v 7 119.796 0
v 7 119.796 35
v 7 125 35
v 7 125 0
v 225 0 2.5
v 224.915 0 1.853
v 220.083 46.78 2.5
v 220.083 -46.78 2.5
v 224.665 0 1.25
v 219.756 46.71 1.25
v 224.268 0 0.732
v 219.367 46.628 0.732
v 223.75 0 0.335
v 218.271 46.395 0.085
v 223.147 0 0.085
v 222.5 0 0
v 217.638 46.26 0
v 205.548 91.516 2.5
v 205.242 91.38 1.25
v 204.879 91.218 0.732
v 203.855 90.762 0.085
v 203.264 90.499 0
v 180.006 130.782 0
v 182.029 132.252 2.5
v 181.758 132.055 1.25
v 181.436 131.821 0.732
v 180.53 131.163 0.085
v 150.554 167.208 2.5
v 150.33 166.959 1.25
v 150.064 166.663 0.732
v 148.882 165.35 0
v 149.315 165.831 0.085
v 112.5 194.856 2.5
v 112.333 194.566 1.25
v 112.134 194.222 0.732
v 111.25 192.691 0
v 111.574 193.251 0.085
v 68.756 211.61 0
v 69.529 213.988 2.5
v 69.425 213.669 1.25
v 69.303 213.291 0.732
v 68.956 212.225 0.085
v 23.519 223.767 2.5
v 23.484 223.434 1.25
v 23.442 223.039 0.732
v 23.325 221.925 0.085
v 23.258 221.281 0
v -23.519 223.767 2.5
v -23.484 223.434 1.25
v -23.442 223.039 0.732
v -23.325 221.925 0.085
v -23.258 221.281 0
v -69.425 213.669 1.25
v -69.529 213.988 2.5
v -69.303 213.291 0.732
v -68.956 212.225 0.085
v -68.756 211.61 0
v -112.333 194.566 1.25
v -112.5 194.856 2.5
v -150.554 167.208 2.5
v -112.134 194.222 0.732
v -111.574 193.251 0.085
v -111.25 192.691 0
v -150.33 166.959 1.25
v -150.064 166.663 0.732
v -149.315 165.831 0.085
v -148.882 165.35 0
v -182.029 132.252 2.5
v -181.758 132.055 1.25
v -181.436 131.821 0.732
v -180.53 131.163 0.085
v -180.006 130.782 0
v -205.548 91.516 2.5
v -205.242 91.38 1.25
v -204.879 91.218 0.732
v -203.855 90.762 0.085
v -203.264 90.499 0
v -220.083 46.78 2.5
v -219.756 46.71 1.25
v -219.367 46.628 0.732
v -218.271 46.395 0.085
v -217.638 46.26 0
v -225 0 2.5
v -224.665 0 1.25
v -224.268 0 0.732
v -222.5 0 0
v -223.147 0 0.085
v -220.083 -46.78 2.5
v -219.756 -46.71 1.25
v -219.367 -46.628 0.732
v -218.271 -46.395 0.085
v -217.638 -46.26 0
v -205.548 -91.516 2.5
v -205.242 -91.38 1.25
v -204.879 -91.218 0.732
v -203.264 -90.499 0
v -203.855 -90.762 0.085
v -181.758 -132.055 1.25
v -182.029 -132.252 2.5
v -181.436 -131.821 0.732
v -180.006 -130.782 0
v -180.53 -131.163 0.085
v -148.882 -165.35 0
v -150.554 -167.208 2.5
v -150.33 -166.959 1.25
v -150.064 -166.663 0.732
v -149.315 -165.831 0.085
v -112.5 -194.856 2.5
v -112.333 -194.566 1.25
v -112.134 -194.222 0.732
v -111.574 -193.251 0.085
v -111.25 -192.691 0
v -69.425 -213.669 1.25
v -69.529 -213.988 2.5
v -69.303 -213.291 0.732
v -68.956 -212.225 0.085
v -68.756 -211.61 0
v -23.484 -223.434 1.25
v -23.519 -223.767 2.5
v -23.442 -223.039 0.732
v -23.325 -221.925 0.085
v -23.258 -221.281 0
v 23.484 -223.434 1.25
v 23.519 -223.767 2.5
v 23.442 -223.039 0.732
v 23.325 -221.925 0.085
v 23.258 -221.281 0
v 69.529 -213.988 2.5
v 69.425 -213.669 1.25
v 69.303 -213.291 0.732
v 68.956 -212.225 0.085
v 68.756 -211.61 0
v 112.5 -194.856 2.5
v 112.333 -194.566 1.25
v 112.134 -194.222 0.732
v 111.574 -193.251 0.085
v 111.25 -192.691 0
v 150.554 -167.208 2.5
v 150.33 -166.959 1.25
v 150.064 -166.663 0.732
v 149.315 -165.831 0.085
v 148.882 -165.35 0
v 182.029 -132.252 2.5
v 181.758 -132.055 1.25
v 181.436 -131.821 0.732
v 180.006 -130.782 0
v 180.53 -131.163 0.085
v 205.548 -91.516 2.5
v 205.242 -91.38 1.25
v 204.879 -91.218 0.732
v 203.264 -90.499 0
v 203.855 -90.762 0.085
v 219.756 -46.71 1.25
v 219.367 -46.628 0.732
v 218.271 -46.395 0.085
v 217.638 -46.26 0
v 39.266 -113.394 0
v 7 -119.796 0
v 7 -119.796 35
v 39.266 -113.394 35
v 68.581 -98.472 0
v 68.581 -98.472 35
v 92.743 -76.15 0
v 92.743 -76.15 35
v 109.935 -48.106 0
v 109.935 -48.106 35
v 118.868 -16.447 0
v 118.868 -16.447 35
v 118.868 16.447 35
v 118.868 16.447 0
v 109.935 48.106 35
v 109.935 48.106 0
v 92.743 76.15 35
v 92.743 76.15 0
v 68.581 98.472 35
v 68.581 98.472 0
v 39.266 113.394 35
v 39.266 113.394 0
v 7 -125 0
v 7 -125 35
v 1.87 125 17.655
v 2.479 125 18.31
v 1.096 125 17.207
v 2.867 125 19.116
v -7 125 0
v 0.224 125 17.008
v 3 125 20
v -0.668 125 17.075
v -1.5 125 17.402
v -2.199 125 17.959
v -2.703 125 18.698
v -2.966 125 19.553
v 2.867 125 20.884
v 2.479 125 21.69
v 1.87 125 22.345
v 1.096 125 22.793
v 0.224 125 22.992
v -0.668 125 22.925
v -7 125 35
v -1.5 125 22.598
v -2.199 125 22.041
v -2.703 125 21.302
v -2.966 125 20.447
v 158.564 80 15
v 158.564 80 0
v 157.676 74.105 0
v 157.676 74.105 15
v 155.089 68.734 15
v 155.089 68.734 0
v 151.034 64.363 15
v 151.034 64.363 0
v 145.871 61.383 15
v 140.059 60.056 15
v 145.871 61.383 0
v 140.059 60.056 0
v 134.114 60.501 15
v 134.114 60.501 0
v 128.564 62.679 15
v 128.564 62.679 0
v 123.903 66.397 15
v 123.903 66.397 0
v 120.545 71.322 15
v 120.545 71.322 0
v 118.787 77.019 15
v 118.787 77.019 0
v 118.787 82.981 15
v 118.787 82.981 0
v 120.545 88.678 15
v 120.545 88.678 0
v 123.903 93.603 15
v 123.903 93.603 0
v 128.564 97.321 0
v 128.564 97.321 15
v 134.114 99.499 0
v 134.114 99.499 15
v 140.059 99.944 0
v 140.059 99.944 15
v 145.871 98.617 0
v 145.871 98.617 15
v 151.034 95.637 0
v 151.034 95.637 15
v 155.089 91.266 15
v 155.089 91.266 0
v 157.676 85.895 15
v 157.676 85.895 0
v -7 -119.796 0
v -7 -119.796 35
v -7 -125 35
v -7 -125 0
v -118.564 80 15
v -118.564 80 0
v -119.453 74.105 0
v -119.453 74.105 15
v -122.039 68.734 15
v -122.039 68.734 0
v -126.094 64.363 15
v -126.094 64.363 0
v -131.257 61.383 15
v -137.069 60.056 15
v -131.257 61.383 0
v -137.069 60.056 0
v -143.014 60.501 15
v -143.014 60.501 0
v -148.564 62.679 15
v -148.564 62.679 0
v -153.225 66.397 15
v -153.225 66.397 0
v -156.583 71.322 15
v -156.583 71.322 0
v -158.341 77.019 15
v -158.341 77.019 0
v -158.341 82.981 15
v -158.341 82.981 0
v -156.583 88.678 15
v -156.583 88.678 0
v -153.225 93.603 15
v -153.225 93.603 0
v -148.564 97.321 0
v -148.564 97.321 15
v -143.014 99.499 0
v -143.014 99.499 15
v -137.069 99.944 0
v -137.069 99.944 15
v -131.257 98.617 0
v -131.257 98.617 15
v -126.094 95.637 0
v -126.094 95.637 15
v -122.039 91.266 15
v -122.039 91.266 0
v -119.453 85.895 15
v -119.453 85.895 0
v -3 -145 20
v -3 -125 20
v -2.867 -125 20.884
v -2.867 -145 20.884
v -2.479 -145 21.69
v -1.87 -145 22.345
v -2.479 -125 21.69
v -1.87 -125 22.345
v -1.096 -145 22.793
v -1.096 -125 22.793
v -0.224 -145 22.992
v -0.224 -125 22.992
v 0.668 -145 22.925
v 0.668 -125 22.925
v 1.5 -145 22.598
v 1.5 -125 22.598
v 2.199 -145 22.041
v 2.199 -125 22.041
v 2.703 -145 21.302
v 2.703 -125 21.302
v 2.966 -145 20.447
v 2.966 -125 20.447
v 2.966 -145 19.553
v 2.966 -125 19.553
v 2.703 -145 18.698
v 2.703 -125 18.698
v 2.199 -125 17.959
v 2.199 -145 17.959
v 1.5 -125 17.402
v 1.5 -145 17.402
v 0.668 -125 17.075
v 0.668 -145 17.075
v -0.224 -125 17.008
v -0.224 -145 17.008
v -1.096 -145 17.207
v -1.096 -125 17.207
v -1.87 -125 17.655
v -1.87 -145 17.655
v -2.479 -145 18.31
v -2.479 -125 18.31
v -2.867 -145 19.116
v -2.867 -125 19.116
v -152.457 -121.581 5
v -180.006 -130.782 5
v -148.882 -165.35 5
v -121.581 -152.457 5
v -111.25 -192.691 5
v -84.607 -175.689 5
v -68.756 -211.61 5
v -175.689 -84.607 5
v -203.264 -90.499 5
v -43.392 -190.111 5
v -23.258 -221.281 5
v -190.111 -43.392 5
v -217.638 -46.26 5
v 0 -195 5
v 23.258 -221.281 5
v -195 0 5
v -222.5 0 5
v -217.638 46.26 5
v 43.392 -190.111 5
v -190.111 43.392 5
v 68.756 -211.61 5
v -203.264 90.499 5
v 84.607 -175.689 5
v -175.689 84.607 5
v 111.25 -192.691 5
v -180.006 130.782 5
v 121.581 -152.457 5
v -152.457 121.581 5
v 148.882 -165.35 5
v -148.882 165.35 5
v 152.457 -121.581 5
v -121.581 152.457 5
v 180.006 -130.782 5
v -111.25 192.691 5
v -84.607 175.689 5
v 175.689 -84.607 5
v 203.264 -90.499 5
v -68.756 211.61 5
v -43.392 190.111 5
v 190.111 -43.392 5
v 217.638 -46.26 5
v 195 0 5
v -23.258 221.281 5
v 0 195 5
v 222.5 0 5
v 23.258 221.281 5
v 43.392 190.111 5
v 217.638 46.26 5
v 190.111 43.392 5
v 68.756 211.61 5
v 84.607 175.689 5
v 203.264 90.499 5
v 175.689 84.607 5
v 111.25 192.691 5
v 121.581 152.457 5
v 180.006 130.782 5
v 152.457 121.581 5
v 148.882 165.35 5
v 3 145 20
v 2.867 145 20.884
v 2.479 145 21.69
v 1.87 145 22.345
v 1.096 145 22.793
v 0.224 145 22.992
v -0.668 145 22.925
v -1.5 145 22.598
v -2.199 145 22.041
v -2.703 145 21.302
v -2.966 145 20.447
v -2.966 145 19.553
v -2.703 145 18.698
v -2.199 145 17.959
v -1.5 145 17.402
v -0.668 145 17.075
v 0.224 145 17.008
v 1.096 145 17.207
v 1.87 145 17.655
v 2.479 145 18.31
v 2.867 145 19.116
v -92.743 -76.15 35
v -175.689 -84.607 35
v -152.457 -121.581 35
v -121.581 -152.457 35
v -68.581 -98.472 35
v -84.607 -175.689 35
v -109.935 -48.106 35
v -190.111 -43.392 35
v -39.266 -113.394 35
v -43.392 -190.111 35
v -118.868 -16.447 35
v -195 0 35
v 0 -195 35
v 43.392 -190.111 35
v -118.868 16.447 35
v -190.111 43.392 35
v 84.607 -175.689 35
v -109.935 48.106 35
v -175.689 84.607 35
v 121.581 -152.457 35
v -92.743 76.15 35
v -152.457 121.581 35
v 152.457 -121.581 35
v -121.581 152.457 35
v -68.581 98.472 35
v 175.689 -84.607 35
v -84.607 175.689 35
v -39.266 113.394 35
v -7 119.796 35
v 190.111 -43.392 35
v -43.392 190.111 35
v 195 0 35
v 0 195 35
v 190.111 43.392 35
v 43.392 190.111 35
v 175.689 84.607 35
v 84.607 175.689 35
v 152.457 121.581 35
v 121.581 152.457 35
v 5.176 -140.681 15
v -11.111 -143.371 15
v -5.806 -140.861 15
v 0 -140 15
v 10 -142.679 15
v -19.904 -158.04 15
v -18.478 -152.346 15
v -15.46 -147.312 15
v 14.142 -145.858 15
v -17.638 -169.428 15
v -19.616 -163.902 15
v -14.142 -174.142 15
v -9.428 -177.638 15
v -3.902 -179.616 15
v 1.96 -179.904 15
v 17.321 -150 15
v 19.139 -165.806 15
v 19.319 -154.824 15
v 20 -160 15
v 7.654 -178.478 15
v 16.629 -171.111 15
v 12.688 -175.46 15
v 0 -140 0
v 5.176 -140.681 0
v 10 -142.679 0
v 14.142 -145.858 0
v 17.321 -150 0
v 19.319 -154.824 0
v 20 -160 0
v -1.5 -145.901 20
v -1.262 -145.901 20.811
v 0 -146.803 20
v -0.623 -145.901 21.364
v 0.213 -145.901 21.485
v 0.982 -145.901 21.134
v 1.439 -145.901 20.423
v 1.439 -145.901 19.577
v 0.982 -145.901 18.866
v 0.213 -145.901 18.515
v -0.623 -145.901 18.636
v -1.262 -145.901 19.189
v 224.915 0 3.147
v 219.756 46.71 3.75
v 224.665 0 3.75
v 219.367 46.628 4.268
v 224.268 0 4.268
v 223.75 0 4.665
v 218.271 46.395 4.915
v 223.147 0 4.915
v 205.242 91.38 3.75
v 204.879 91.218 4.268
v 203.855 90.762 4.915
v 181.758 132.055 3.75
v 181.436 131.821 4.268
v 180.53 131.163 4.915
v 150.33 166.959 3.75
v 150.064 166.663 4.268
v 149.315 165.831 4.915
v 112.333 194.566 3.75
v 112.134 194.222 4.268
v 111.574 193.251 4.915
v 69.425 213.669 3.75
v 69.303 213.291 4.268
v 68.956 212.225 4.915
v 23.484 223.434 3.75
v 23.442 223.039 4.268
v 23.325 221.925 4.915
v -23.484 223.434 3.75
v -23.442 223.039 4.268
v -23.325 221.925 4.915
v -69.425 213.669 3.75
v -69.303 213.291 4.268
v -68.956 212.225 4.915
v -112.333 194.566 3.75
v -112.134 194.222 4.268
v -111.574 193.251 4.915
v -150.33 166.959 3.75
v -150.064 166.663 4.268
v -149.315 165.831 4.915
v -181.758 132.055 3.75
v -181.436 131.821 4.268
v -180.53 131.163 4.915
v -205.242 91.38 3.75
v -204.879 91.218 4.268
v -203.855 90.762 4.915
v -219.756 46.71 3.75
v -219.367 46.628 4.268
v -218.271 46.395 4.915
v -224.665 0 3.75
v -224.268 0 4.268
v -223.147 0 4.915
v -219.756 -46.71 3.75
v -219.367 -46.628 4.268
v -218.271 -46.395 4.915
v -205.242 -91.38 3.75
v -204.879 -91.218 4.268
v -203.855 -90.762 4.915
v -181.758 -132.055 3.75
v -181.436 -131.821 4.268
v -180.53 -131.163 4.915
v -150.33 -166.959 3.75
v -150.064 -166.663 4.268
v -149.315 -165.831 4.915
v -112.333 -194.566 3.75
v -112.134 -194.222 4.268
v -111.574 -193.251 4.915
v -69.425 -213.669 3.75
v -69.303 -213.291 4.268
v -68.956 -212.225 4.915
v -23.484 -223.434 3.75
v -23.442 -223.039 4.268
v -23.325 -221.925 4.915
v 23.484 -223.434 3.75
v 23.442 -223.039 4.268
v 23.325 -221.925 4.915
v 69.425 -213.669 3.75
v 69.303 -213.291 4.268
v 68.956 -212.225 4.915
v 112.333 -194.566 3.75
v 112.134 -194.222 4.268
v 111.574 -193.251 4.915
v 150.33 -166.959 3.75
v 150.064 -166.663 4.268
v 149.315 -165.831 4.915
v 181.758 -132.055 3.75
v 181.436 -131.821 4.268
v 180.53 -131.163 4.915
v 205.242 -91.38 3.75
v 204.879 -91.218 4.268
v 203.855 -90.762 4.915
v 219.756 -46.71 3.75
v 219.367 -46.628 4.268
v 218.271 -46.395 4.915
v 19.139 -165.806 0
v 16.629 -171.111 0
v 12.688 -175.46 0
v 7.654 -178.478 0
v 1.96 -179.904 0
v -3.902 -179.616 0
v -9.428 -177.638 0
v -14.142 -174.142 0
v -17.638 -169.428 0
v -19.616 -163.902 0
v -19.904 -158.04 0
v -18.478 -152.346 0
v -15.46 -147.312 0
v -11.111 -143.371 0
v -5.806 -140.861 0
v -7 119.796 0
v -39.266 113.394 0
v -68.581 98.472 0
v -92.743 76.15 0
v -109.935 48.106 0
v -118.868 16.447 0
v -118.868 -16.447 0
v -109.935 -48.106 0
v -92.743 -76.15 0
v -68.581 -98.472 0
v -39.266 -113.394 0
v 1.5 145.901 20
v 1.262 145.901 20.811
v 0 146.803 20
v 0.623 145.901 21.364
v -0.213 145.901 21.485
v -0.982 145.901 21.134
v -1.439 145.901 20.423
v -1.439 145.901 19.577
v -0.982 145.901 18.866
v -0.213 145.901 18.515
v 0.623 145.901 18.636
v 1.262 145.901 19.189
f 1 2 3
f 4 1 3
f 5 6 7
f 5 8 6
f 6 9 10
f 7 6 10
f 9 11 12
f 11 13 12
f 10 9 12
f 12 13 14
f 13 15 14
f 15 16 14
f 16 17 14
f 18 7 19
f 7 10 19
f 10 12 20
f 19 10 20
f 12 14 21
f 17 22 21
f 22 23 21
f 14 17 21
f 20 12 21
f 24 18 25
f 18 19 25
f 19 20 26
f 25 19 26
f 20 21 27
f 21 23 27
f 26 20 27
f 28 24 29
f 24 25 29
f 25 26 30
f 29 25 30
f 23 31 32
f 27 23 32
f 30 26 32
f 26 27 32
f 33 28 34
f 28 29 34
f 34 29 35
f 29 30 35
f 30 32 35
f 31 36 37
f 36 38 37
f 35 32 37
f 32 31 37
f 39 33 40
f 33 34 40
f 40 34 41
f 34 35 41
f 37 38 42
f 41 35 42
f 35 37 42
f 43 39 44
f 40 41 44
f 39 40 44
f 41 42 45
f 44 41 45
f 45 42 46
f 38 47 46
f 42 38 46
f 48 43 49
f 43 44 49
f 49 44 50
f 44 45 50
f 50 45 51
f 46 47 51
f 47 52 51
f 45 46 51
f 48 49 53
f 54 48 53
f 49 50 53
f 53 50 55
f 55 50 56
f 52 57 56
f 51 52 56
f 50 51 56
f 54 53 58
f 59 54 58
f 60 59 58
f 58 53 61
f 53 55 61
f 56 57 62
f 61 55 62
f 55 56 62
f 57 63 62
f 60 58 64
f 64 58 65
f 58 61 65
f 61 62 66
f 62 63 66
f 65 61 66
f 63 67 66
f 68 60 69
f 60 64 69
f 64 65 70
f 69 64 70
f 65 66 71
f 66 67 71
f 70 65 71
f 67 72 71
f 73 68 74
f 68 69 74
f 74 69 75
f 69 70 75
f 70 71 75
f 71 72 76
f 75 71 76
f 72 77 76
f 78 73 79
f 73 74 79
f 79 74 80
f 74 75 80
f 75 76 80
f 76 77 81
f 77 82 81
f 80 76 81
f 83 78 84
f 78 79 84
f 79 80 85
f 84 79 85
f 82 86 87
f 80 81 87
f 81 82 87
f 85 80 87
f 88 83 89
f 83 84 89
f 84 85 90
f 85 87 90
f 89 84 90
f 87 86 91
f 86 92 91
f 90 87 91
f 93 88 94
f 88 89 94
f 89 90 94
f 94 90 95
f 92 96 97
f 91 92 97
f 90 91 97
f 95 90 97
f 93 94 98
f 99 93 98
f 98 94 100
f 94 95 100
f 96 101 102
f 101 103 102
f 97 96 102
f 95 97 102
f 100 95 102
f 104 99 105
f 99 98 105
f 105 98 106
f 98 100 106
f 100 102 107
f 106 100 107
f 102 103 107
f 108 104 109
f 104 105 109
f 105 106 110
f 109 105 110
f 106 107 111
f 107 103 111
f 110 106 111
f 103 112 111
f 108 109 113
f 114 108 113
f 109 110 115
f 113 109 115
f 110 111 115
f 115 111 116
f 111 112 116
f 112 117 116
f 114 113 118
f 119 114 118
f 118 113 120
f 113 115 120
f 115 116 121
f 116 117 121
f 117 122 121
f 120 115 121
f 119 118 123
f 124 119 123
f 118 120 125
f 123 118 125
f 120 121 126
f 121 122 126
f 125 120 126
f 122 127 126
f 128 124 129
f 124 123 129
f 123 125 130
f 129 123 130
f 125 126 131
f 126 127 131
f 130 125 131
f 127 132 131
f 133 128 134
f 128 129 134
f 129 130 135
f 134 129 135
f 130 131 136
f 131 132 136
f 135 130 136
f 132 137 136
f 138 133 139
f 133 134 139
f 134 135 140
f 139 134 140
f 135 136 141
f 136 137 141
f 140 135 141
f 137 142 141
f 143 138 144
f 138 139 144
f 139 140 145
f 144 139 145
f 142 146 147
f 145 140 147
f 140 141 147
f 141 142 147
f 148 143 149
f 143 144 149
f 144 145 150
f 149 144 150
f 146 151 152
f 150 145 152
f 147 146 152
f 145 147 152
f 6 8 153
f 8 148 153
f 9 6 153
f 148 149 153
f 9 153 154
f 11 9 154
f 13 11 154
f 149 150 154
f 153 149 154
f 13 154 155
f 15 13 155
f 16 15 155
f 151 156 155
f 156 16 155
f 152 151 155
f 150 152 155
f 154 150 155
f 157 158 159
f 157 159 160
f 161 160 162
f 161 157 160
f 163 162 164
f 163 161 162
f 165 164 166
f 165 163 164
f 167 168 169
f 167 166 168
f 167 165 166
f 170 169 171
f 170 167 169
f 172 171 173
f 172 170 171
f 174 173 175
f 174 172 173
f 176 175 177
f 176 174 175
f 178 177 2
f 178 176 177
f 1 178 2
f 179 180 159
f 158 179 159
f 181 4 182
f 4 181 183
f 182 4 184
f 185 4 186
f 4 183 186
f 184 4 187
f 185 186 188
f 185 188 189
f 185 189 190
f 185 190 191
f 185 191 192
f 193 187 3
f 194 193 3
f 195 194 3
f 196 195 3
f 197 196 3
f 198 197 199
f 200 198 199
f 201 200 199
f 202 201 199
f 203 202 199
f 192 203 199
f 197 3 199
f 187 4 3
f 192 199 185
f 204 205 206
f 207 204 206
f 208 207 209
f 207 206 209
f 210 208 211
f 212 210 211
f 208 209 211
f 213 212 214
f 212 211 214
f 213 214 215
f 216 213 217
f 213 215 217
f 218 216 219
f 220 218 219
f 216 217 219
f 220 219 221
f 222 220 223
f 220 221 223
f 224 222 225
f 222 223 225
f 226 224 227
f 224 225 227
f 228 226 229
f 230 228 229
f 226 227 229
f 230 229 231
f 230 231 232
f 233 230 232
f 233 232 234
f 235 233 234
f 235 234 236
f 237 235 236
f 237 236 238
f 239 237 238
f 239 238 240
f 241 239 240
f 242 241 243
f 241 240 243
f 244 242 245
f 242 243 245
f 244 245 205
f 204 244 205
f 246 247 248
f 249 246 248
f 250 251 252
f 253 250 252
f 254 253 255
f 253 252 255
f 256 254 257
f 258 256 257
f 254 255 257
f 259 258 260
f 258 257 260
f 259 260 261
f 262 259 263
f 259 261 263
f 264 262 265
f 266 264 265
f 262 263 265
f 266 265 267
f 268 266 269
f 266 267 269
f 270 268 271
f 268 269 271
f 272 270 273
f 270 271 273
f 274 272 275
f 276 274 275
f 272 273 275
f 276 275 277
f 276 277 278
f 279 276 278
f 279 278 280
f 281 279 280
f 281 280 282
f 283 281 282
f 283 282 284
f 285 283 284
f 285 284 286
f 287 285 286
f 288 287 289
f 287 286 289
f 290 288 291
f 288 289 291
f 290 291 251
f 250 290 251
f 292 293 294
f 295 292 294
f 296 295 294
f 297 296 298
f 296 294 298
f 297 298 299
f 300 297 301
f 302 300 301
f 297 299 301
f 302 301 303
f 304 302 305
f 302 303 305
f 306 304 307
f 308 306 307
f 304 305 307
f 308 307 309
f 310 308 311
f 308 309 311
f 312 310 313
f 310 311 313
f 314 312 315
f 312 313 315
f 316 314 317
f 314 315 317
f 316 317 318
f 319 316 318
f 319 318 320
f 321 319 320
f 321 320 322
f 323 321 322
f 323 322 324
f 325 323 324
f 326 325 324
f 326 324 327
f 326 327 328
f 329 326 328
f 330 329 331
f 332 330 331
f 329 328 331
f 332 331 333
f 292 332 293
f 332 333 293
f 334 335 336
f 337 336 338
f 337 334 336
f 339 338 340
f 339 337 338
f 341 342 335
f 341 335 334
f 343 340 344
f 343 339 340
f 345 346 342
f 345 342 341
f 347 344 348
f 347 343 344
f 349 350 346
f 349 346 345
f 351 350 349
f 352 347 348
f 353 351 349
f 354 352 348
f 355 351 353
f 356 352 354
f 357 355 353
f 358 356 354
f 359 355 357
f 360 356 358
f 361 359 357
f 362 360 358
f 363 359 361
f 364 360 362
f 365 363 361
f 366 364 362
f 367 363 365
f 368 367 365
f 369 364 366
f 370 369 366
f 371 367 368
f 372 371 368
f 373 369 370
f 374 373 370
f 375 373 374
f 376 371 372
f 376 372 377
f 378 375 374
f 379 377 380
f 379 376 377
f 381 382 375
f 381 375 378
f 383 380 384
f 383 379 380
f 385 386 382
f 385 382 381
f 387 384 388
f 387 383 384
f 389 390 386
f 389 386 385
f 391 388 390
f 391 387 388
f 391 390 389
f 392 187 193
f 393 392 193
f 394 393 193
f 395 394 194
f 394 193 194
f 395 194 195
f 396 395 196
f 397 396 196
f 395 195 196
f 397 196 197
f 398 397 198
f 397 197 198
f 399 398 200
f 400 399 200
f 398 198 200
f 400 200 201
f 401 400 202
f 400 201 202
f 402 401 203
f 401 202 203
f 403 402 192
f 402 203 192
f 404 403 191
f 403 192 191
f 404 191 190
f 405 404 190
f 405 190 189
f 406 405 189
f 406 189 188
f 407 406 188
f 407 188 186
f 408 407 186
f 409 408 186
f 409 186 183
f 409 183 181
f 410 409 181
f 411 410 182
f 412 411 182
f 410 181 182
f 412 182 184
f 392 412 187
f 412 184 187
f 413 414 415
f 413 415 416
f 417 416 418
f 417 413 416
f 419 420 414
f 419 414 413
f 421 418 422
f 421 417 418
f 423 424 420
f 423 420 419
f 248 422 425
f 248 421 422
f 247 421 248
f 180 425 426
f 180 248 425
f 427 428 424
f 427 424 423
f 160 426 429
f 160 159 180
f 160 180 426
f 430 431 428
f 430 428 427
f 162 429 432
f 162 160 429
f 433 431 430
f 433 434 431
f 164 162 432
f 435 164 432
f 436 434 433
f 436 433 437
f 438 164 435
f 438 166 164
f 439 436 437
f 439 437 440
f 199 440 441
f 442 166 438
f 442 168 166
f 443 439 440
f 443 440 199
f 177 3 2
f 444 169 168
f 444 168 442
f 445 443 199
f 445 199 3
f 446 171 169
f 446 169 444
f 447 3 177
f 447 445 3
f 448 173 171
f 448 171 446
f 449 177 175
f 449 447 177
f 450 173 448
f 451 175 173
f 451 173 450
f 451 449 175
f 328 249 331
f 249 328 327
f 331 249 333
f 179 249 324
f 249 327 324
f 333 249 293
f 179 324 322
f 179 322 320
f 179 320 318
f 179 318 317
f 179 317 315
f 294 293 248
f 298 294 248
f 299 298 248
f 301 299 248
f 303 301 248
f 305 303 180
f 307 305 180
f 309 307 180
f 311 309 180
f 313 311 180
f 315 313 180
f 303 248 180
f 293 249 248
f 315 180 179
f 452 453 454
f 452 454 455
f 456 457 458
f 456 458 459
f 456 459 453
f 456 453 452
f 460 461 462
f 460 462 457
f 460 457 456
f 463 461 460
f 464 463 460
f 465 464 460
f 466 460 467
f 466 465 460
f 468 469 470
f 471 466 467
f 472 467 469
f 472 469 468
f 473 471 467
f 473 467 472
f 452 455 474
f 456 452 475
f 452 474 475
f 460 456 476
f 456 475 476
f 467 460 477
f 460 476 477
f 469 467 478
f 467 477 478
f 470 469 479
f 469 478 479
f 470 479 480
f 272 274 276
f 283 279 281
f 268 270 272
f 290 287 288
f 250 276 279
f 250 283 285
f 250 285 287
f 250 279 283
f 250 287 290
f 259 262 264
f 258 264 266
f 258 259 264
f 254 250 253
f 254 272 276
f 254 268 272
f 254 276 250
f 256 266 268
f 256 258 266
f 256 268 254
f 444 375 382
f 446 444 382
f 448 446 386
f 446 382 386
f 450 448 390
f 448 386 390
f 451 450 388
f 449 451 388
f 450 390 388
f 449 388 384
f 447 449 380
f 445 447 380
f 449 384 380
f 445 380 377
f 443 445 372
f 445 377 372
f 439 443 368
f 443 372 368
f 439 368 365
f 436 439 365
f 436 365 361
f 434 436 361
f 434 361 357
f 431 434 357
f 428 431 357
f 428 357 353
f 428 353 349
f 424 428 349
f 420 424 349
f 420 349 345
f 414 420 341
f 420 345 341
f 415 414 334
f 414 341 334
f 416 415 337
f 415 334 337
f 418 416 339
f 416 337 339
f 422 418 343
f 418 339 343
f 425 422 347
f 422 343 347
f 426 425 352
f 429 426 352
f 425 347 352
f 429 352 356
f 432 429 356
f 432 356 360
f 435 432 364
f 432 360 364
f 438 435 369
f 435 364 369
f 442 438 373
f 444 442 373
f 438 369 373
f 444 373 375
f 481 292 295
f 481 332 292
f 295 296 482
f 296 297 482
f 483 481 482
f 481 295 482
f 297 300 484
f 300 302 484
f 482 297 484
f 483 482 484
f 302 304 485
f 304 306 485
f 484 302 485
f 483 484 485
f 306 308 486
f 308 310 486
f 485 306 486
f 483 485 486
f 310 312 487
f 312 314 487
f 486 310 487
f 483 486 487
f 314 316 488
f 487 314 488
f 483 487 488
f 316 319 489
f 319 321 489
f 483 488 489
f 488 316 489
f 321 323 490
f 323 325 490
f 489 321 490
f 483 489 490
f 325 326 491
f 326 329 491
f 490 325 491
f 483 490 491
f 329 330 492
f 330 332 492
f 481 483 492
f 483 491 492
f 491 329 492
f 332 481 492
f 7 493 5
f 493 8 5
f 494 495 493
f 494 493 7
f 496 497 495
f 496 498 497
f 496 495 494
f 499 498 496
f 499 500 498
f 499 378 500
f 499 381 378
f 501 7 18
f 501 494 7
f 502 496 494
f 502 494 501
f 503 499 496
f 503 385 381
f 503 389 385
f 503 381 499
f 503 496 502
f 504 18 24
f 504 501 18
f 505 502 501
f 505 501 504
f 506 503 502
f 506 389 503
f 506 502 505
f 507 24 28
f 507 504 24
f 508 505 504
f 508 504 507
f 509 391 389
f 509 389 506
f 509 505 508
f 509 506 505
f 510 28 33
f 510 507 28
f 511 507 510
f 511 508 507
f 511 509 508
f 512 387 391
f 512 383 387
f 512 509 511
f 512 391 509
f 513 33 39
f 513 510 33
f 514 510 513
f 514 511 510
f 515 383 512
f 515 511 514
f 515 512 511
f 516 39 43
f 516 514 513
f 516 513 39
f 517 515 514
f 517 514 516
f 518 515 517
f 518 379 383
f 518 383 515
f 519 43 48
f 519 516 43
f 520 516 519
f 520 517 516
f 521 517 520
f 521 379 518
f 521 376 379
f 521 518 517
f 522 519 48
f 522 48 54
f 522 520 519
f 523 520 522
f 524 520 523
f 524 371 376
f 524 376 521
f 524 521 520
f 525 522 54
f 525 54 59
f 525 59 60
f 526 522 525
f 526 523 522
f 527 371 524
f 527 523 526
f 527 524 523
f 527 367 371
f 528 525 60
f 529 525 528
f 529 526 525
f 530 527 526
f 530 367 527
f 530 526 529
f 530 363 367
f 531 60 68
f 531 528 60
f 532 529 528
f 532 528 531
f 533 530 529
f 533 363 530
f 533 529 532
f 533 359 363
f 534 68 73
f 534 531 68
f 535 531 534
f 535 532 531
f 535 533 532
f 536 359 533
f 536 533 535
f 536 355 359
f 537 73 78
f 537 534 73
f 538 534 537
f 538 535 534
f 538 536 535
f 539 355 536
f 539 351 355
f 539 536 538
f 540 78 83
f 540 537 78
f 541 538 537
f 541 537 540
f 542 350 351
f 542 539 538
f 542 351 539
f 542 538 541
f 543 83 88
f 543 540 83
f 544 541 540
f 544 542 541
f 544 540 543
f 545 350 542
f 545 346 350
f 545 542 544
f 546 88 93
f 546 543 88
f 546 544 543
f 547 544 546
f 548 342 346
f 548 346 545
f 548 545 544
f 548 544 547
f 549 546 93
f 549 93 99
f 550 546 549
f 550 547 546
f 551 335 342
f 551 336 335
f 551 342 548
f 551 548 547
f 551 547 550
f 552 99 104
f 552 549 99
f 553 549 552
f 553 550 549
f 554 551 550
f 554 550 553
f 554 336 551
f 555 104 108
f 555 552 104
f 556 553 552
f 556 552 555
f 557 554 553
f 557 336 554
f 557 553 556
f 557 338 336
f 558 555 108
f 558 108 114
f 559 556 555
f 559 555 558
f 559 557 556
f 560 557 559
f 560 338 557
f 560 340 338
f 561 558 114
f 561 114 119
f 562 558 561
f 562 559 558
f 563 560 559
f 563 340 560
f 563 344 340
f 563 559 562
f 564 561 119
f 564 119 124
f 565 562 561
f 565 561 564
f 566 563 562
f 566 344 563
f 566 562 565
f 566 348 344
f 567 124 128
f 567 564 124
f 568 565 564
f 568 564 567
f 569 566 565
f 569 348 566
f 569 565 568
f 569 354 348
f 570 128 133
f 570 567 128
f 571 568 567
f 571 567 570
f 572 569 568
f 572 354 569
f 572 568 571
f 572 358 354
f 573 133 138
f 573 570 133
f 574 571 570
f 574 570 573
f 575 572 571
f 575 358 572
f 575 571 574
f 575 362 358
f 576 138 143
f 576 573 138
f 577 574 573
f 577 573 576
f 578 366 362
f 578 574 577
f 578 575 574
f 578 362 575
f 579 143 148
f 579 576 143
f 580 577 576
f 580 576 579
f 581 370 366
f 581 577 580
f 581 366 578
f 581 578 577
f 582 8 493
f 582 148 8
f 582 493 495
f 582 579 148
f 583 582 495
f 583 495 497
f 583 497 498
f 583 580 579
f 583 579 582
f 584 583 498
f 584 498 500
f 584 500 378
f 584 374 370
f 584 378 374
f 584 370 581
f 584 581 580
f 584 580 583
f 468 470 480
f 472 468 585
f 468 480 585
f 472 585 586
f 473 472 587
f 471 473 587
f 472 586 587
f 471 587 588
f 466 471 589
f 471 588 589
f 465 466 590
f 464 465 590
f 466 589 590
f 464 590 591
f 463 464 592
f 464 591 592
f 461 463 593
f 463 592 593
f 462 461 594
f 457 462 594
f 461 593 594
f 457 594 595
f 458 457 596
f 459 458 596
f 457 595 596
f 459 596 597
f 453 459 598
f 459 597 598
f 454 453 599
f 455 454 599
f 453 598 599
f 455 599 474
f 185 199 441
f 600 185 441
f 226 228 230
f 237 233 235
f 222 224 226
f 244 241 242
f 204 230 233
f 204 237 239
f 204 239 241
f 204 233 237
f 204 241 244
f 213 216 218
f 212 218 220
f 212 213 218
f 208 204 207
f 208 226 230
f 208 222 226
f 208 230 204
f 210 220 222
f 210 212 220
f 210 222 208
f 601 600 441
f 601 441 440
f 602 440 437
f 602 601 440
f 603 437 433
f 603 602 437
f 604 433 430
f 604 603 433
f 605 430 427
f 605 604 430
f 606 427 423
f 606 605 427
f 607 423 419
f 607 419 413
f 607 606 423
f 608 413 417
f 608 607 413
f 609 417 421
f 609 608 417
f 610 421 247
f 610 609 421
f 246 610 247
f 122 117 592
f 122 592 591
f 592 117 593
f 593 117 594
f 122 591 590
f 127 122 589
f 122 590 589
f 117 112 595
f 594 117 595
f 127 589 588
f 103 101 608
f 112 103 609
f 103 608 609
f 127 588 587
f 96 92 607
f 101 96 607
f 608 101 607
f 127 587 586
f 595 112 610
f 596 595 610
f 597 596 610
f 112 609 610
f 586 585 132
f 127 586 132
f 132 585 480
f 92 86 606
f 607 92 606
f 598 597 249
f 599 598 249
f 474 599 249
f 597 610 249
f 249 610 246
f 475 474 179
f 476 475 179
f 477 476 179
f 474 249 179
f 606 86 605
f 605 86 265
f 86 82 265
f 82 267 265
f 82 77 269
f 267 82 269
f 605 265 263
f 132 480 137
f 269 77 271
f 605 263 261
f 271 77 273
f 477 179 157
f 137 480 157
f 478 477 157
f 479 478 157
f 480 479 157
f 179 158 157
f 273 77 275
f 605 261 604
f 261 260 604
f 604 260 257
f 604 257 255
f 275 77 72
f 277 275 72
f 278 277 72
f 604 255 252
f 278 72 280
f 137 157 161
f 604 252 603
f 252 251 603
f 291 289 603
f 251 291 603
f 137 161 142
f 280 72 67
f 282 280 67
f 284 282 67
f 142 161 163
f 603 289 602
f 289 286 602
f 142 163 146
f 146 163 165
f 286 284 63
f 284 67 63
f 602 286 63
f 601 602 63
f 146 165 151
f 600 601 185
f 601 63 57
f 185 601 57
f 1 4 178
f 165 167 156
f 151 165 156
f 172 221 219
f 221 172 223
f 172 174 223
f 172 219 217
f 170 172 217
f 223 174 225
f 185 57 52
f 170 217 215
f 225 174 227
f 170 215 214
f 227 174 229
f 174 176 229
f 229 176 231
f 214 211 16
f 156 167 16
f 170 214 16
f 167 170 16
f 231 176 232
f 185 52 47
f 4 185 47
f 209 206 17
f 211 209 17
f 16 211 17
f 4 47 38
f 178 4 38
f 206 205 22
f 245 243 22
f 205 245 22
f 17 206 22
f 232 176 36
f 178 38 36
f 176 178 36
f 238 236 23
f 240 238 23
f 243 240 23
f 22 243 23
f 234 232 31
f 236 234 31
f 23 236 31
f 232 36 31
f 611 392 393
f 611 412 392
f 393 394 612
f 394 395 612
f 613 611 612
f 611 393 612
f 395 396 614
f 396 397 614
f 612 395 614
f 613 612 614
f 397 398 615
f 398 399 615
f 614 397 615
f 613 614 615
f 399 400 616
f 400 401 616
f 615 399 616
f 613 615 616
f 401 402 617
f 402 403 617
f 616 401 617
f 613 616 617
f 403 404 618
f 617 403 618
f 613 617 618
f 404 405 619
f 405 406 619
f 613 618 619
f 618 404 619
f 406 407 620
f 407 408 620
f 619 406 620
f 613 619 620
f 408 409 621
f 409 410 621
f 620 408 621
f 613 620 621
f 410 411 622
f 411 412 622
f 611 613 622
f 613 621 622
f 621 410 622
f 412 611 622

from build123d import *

# Parameters (mm, degrees)
F0_R      = 225
F0_R_2    = 120
F1_DEPTH  = 5
F2_R      = 2.49999
F3_R      = 195
F3_R_2    = 120
F4_DEPTH  = 30
F5_R      = 20
F6_DEPTH  = 15
F8_DEPTH  = 35.001
F10_D     = 6
F10_DEPTH = 20
F10_TIP   = 1.8025818571
F12_D     = 6
F12_DEPTH = 20
F12_TIP   = 1.8025818571


# Not quite as in the source:
# - a fillet or chamfer is up to 0.001 mm smaller than in the source, because OpenCascade refuses the exact size
# - a feature names something its author has since deleted; it is built from what else it names


with BuildPart() as f1:
    # F0 (on Top) → F1 (new body)
    with BuildSketch(Plane.XY):
        Circle(F0_R)
        Circle(F0_R_2, mode=Mode.SUBTRACT)
    extrude(amount=F1_DEPTH)

    # F2 (radius 2.5 in the source; OpenCascade refuses exactly that, so slightly less here)
    f2_edges = [f1.edges().sort_by_distance(p)[0] for p in [
        (-225, 0, 5),
        (-225, 0, 0),
    ]]
    fillet(f2_edges, radius=F2_R)

    # F3 (on face) → F4 (join)
    with BuildSketch(Plane.XY.offset(5)):
        Circle(F3_R)
        Circle(F3_R_2, mode=Mode.SUBTRACT)
    extrude(amount=F4_DEPTH)

    # F5 (on face) → F6 (cut)
    with BuildSketch(Plane(origin=(0, 0, 0), x_dir=(1, 0, 0), z_dir=(0, 0, -1))):
        with BuildLine():
            ThreePointArc((20, 160), (-14.1421356237, 174.1421356237), (0, 140))
            ThreePointArc((0, 140), (14.1421356237, 145.8578643763), (20, 160))
        make_face()
        with Locations((138.5640646055, -80)):
            Circle(F5_R)
        with Locations((-138.5640646055, -80)):
            Circle(F5_R)
    extrude(amount=-F6_DEPTH, mode=Mode.SUBTRACT)

    # F7 (on face) → F8 (cut, through all)
    with BuildSketch(Plane.XY.offset(35)):
        with BuildLine():
            Line((0, 125), (0, 120))
            ThreePointArc((0, 120), (3.501490936, 119.9489039601), (7, 119.7956593538))
            Line((7, 119.7956593538), (7, 125))
            Line((7, 125), (0, 125))
        make_face()
        with BuildLine():
            ThreePointArc((-7, 119.7956593538), (-3.501490936, 119.9489039601), (0, 120))
            Line((0, 120), (0, 125))
            Line((0, 125), (-7, 125))
            Line((-7, 125), (-7, 119.7956593538))
        make_face()
        with BuildLine():
            Line((7, -125), (7, -119.7956593538))
            ThreePointArc((7, -119.7956593538), (3.501490936, -119.9489039601), (0, -120))
            Line((0, -120), (0, -125))
            Line((0, -125), (7, -125))
        make_face()
        with BuildLine():
            ThreePointArc((0, -120), (-3.501490936, -119.9489039601), (-7, -119.7956593538))
            Line((-7, -119.7956593538), (-7, -125))
            Line((-7, -125), (0, -125))
            Line((0, -125), (0, -120))
        make_face()
    extrude(amount=-F8_DEPTH, mode=Mode.SUBTRACT)

    # F10 (one way)
    with BuildSketch(Plane(origin=(0, -125, 0), x_dir=(-1, 0, 0), z_dir=(0, 1, 0))):
        with Locations((0, 20)):
            Circle(F10_D / 2)
    extrude(amount=-F10_DEPTH, mode=Mode.SUBTRACT)
    with Locations(Plane(origin=(0, -125, 0), x_dir=(-1, 0, 0), z_dir=(0, 1, 0))):
        with Locations((0, 20)):
            with Locations((0, 0, -(F10_DEPTH + F10_TIP / 2))):  # 118° drill point
                Cone(0, F10_D / 2, F10_TIP, mode=Mode.SUBTRACT)

    # F12 (one way)
    with BuildSketch(Plane.XZ.offset(-125)):
        with Locations((0, 20)):
            Circle(F12_D / 2)
    extrude(amount=-F12_DEPTH, mode=Mode.SUBTRACT)
    with Locations(Plane.XZ.offset(-125)):
        with Locations((0, 20)):
            with Locations((0, 0, -(F12_DEPTH + F12_TIP / 2))):  # 118° drill point
                Cone(0, F12_D / 2, F12_TIP, mode=Mode.SUBTRACT)


solid = f1.part
